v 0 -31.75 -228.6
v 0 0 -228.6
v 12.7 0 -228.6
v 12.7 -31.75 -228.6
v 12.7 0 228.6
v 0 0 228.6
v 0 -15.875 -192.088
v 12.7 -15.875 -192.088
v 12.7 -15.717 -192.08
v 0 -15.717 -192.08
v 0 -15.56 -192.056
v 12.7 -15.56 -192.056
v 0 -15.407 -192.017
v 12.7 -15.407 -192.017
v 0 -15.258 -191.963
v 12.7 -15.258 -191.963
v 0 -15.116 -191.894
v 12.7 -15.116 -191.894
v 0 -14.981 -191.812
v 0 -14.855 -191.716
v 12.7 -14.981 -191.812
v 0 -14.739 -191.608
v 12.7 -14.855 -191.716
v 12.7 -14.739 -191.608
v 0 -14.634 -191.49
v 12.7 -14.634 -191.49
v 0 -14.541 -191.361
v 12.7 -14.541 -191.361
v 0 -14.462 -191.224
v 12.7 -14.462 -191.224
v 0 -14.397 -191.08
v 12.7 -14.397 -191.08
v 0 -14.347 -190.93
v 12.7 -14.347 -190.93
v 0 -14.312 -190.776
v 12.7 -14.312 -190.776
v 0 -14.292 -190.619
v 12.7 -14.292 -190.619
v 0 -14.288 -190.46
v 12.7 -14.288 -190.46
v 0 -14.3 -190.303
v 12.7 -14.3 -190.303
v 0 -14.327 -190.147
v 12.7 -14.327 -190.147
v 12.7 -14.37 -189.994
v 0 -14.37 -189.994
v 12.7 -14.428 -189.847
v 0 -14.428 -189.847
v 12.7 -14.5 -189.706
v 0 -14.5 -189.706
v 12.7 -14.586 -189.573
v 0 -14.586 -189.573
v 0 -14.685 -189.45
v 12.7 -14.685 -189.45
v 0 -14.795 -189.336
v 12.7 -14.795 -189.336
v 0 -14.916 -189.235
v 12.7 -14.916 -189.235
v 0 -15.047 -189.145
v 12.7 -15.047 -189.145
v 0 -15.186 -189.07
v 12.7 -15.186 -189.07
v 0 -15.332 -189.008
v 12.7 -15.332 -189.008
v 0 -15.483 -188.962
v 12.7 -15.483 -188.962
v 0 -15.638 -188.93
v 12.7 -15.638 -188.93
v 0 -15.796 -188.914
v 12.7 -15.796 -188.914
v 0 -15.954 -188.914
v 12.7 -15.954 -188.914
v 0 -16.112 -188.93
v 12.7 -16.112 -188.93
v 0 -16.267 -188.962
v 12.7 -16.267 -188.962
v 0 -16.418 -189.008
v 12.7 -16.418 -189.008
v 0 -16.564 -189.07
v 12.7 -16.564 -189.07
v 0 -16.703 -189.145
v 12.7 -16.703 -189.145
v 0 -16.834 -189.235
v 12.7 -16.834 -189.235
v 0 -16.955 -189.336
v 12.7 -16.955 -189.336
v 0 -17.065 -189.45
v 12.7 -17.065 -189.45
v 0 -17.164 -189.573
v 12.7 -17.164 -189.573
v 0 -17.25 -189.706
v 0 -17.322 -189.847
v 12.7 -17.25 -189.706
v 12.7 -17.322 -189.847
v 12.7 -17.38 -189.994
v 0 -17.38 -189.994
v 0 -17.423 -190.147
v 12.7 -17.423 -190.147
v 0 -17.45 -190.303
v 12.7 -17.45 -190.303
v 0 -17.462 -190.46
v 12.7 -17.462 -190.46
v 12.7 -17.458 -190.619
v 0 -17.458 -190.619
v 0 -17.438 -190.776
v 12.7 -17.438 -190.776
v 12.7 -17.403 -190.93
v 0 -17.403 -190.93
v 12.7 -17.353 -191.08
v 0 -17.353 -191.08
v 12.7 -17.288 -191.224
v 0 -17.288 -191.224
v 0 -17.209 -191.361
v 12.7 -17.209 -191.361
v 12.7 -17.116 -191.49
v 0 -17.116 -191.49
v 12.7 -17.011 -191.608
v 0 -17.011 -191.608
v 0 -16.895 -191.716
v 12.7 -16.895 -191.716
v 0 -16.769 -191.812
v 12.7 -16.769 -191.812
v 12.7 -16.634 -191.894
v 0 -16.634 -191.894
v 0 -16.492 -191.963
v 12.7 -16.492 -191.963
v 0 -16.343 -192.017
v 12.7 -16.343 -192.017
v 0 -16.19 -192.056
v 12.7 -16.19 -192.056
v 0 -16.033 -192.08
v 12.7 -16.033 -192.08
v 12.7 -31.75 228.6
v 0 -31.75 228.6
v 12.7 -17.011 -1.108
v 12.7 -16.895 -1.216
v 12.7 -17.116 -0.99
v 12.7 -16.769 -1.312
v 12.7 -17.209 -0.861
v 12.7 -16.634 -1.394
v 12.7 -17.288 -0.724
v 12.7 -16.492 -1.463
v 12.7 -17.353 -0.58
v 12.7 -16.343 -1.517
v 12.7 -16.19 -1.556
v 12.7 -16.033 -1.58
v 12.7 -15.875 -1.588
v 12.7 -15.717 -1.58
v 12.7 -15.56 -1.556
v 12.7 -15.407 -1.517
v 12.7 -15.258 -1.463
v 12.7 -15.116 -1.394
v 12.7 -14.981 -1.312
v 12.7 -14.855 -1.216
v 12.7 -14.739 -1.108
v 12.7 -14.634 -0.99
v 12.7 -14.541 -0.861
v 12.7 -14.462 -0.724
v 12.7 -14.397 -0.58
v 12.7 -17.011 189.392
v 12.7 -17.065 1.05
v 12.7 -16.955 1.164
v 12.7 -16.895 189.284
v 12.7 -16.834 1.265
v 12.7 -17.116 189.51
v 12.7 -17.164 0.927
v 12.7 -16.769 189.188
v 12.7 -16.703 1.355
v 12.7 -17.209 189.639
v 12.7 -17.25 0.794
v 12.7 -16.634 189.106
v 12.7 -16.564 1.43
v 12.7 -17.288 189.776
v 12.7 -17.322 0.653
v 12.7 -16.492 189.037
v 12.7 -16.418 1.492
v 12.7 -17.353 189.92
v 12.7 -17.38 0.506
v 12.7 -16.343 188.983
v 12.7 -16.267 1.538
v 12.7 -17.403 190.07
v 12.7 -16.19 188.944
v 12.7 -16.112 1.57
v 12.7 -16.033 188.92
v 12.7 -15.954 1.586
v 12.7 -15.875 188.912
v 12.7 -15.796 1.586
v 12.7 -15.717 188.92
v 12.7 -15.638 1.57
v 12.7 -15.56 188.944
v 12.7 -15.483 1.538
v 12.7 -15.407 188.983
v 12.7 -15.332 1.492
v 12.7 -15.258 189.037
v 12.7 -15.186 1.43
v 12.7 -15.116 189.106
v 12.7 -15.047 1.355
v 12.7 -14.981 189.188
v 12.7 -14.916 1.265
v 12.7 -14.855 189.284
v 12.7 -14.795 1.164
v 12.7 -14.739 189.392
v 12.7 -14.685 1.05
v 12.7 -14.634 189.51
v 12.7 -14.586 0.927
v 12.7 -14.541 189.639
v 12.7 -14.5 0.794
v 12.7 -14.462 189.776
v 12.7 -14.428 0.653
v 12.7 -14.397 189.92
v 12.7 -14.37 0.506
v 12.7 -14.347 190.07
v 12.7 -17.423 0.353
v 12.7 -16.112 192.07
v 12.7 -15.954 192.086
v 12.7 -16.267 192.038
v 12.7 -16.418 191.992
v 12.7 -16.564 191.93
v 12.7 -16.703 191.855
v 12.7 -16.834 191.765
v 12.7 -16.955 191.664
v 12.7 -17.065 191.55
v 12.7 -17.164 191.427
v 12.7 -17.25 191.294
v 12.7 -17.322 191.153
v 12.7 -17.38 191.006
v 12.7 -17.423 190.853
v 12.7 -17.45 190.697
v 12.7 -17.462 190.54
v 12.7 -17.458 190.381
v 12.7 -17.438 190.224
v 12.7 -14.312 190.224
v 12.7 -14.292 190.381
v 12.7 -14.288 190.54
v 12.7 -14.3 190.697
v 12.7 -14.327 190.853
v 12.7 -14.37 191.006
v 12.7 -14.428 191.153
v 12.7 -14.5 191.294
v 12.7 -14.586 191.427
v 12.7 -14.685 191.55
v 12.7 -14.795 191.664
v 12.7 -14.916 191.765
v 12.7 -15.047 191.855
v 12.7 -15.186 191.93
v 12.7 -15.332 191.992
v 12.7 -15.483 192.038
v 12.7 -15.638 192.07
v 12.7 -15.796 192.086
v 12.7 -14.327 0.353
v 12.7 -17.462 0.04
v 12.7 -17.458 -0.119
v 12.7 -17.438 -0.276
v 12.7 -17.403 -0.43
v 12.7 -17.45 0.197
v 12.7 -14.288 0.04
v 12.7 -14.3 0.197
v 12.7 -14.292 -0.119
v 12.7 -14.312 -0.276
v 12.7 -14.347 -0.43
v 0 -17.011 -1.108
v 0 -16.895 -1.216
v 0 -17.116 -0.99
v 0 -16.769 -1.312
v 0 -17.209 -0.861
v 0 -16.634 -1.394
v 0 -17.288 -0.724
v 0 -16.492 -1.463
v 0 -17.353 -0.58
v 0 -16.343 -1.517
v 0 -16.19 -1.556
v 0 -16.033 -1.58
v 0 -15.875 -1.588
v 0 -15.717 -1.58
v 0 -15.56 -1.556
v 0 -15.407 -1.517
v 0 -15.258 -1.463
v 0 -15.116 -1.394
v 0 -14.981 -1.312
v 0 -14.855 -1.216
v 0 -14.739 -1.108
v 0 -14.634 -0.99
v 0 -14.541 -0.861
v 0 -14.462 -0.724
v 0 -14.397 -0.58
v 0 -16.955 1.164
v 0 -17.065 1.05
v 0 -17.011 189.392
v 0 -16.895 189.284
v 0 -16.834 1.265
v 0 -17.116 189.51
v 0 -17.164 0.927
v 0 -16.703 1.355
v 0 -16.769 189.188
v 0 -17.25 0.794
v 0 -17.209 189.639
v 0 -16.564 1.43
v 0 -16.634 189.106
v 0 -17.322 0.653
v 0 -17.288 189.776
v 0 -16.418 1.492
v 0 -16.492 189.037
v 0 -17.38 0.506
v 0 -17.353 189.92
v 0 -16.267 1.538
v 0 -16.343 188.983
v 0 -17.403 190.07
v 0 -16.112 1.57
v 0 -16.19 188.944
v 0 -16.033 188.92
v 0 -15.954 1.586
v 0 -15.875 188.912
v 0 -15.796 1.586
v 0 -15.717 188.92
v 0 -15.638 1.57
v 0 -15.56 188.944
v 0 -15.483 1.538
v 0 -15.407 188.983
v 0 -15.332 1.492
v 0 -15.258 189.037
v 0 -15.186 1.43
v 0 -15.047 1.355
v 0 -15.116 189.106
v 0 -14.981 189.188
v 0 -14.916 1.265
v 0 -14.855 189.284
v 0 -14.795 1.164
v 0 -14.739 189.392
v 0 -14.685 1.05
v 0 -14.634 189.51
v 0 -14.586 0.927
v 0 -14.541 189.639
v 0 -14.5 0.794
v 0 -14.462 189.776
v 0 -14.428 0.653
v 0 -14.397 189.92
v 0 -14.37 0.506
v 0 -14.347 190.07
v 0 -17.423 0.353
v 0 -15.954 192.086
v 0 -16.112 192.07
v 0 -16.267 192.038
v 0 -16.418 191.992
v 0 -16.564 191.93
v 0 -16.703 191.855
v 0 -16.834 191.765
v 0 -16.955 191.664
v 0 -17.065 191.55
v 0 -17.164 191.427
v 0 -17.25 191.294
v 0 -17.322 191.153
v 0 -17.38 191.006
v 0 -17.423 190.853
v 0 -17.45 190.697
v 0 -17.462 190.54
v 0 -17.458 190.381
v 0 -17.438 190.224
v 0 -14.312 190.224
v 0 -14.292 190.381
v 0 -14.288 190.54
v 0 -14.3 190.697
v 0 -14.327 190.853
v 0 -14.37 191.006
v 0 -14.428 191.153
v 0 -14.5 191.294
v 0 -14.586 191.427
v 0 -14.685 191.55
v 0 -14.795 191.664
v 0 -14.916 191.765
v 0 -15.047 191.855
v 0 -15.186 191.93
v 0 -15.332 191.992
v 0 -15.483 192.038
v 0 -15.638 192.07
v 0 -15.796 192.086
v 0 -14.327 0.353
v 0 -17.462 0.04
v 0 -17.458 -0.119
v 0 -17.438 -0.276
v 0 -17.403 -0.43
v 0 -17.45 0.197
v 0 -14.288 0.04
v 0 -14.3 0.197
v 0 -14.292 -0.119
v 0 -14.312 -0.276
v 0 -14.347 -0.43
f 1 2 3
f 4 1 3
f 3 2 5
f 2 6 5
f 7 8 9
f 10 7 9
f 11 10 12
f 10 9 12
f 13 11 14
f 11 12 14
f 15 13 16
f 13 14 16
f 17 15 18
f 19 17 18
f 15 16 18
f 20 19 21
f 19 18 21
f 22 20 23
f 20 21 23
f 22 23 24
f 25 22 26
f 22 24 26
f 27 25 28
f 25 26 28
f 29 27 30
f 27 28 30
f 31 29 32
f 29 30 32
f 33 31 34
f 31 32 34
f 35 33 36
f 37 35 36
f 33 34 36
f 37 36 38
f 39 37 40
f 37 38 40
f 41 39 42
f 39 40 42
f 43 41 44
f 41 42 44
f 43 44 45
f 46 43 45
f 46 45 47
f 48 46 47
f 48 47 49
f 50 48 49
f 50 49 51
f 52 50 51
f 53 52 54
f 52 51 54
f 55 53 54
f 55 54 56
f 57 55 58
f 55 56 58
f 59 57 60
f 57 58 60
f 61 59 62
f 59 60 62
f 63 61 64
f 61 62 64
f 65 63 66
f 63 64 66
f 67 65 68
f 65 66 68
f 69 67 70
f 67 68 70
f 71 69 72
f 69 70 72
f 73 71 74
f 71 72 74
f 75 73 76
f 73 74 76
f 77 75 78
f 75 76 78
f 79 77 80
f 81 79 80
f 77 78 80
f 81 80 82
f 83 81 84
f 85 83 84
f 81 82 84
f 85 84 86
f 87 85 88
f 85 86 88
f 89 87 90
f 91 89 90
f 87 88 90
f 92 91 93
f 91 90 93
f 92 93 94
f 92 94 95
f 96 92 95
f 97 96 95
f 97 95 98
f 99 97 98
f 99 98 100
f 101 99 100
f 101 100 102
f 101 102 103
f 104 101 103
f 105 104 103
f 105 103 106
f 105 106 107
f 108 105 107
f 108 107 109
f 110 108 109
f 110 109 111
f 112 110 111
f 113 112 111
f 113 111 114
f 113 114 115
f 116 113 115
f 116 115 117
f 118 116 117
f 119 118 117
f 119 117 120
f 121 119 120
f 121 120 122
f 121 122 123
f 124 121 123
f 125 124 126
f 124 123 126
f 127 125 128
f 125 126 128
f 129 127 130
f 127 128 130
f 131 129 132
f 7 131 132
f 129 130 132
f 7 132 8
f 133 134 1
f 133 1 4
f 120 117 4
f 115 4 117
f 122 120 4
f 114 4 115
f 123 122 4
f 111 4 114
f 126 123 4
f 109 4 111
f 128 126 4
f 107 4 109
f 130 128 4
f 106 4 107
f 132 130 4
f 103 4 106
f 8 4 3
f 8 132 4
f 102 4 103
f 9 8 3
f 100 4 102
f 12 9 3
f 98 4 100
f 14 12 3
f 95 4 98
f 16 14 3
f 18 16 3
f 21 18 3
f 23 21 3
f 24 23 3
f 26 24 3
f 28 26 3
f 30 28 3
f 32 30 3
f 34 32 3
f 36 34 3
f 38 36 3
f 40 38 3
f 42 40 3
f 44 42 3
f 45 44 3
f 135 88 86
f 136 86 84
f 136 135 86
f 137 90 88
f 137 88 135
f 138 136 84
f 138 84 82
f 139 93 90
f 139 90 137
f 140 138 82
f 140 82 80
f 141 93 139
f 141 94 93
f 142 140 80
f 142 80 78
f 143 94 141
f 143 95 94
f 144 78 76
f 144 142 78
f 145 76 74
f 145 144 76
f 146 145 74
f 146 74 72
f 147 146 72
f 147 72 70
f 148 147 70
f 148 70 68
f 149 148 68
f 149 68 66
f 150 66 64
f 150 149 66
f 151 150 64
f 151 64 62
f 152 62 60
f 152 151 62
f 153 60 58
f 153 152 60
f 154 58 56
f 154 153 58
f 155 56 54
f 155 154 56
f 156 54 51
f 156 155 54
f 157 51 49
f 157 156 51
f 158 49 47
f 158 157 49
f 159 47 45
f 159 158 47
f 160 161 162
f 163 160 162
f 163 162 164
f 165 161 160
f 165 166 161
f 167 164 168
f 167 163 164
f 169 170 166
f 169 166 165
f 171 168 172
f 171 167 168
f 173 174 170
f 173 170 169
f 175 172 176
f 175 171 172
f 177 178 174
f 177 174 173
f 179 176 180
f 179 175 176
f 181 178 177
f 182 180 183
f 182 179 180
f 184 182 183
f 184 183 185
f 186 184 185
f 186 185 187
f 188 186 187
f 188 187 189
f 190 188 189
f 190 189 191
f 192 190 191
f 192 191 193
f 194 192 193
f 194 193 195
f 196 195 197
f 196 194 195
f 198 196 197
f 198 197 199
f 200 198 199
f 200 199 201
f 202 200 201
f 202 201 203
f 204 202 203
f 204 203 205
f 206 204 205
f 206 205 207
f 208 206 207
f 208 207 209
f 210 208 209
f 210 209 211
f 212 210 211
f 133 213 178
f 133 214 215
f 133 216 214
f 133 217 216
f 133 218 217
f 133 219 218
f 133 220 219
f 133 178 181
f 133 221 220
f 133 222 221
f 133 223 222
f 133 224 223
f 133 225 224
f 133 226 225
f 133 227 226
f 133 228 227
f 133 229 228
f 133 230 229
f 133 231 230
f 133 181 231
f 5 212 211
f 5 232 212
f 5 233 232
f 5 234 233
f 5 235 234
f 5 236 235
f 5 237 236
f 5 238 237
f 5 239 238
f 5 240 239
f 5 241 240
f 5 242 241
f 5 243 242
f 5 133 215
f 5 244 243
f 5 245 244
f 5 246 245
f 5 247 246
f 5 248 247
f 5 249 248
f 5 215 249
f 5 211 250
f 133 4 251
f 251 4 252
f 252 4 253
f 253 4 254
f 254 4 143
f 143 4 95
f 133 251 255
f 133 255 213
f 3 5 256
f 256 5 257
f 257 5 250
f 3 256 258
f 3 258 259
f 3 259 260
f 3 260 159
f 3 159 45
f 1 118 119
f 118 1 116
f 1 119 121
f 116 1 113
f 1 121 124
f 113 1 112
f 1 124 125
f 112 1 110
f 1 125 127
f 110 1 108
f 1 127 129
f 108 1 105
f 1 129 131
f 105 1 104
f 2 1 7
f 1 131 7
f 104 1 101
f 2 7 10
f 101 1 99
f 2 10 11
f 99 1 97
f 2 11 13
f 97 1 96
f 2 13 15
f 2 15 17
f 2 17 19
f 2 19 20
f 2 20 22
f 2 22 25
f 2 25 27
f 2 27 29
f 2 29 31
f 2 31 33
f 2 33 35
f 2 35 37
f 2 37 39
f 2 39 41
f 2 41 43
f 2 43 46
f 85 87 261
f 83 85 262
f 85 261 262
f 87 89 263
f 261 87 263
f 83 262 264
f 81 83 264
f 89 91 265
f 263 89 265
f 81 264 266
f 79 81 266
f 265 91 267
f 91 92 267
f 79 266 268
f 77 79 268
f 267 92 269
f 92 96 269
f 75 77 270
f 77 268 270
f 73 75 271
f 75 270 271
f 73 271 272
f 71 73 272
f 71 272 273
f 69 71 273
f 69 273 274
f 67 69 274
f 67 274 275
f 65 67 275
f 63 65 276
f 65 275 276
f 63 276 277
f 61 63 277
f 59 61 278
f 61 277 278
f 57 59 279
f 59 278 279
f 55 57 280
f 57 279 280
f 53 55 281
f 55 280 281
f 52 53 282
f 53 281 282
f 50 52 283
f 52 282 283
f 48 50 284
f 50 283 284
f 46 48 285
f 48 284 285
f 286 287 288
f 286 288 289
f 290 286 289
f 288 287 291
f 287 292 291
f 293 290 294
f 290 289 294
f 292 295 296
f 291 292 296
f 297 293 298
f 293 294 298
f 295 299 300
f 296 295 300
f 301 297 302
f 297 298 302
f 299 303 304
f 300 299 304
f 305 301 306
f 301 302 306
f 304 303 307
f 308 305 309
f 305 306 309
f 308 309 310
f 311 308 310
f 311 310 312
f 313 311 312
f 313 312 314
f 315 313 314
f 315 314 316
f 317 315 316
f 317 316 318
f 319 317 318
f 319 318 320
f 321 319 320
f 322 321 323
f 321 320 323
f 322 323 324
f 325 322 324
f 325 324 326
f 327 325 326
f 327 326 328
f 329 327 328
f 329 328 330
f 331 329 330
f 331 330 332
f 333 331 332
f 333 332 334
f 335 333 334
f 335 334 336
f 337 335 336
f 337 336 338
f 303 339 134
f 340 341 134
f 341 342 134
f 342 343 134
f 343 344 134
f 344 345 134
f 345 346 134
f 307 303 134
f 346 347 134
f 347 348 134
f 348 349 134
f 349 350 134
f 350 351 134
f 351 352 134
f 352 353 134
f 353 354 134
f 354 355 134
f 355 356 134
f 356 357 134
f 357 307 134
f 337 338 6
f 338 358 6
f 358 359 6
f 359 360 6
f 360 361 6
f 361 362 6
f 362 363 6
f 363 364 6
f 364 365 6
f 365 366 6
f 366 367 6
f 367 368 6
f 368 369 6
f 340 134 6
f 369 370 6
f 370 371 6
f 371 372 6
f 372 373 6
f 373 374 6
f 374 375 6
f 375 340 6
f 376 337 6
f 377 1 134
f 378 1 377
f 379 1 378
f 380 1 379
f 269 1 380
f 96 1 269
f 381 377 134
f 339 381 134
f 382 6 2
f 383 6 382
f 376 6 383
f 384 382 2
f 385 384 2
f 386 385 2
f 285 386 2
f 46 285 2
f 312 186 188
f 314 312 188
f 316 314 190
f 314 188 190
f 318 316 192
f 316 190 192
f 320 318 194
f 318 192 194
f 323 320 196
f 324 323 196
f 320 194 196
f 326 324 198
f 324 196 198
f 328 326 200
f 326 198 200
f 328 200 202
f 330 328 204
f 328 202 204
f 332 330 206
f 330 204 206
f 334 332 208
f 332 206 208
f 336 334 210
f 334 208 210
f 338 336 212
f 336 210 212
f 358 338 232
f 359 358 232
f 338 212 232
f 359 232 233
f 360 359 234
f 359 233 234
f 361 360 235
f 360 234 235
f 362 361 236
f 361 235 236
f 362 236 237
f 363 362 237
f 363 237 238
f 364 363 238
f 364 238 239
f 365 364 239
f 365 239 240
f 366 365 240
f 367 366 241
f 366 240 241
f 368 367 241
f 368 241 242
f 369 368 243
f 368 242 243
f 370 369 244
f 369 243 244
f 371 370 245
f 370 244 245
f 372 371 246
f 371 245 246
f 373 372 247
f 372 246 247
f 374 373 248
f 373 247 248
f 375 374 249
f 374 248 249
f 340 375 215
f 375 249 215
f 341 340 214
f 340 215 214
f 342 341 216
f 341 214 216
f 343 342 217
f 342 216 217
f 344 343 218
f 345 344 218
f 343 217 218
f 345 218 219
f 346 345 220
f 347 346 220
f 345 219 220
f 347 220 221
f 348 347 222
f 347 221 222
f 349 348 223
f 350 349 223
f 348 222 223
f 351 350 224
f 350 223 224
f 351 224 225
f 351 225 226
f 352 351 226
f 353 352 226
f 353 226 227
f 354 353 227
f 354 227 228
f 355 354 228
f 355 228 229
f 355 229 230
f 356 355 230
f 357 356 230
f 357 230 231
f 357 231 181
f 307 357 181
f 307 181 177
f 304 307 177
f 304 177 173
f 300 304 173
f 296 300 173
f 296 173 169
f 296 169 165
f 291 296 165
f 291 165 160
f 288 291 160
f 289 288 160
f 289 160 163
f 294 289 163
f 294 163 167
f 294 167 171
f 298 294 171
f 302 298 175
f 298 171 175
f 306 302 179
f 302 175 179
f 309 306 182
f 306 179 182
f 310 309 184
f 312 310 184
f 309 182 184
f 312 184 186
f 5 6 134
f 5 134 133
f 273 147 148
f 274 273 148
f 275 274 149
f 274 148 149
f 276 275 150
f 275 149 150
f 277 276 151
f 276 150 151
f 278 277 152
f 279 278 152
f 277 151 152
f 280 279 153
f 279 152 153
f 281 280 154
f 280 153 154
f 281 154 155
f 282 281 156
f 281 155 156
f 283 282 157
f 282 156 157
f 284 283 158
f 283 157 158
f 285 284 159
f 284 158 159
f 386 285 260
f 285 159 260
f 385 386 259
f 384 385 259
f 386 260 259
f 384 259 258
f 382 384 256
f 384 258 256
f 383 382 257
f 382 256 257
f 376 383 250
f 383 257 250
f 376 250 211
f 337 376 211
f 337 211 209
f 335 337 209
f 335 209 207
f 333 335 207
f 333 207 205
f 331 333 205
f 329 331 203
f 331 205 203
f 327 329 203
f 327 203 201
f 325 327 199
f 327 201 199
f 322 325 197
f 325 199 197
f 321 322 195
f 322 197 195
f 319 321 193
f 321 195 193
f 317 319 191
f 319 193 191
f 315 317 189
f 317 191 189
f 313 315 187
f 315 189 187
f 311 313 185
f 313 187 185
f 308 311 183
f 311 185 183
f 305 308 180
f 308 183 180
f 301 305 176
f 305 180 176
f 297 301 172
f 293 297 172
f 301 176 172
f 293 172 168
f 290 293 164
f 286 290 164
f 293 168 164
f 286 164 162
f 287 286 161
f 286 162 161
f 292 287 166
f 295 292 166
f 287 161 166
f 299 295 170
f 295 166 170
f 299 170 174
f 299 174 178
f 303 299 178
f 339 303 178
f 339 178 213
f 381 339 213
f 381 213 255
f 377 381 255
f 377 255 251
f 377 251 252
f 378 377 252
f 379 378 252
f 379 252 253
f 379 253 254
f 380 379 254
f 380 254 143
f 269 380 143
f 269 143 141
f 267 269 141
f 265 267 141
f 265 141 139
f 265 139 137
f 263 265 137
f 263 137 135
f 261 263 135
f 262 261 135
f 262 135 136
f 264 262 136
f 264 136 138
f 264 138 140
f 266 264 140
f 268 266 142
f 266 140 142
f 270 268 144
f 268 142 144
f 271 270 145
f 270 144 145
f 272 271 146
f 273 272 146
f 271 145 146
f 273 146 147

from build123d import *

# Parameters (mm, degrees)
SKETCH1_W          = 12.7
SKETCH1_H          = 31.75
EXTRUDE1_DEPTH     = 228.6
SKETCH2_R          = 1.5875
CUT_EXTRUDE1_DEPTH = 12.7


with BuildPart() as part:
    # Sketch1 → Extrude1 (new body, symmetric)
    with BuildSketch(Plane.XY):
        with Locations((6.35, -15.875)):
            Rectangle(SKETCH1_W, SKETCH1_H)
    extrude(amount=EXTRUDE1_DEPTH, both=True)

    # Sketch2 → Cut-Extrude1 (cut)
    with BuildSketch(Plane(origin=(12.7, 0, 0), x_dir=(0, 0, -1), z_dir=(1, 0, 0))):
        with Locations((-190.5, -15.875)):
            Circle(SKETCH2_R)
        with Locations((190.5, -15.875)):
            Circle(SKETCH2_R)
        with Locations((0, -15.875)):
            Circle(SKETCH2_R)
    extrude(amount=-CUT_EXTRUDE1_DEPTH, mode=Mode.SUBTRACT)


solid = part.part
